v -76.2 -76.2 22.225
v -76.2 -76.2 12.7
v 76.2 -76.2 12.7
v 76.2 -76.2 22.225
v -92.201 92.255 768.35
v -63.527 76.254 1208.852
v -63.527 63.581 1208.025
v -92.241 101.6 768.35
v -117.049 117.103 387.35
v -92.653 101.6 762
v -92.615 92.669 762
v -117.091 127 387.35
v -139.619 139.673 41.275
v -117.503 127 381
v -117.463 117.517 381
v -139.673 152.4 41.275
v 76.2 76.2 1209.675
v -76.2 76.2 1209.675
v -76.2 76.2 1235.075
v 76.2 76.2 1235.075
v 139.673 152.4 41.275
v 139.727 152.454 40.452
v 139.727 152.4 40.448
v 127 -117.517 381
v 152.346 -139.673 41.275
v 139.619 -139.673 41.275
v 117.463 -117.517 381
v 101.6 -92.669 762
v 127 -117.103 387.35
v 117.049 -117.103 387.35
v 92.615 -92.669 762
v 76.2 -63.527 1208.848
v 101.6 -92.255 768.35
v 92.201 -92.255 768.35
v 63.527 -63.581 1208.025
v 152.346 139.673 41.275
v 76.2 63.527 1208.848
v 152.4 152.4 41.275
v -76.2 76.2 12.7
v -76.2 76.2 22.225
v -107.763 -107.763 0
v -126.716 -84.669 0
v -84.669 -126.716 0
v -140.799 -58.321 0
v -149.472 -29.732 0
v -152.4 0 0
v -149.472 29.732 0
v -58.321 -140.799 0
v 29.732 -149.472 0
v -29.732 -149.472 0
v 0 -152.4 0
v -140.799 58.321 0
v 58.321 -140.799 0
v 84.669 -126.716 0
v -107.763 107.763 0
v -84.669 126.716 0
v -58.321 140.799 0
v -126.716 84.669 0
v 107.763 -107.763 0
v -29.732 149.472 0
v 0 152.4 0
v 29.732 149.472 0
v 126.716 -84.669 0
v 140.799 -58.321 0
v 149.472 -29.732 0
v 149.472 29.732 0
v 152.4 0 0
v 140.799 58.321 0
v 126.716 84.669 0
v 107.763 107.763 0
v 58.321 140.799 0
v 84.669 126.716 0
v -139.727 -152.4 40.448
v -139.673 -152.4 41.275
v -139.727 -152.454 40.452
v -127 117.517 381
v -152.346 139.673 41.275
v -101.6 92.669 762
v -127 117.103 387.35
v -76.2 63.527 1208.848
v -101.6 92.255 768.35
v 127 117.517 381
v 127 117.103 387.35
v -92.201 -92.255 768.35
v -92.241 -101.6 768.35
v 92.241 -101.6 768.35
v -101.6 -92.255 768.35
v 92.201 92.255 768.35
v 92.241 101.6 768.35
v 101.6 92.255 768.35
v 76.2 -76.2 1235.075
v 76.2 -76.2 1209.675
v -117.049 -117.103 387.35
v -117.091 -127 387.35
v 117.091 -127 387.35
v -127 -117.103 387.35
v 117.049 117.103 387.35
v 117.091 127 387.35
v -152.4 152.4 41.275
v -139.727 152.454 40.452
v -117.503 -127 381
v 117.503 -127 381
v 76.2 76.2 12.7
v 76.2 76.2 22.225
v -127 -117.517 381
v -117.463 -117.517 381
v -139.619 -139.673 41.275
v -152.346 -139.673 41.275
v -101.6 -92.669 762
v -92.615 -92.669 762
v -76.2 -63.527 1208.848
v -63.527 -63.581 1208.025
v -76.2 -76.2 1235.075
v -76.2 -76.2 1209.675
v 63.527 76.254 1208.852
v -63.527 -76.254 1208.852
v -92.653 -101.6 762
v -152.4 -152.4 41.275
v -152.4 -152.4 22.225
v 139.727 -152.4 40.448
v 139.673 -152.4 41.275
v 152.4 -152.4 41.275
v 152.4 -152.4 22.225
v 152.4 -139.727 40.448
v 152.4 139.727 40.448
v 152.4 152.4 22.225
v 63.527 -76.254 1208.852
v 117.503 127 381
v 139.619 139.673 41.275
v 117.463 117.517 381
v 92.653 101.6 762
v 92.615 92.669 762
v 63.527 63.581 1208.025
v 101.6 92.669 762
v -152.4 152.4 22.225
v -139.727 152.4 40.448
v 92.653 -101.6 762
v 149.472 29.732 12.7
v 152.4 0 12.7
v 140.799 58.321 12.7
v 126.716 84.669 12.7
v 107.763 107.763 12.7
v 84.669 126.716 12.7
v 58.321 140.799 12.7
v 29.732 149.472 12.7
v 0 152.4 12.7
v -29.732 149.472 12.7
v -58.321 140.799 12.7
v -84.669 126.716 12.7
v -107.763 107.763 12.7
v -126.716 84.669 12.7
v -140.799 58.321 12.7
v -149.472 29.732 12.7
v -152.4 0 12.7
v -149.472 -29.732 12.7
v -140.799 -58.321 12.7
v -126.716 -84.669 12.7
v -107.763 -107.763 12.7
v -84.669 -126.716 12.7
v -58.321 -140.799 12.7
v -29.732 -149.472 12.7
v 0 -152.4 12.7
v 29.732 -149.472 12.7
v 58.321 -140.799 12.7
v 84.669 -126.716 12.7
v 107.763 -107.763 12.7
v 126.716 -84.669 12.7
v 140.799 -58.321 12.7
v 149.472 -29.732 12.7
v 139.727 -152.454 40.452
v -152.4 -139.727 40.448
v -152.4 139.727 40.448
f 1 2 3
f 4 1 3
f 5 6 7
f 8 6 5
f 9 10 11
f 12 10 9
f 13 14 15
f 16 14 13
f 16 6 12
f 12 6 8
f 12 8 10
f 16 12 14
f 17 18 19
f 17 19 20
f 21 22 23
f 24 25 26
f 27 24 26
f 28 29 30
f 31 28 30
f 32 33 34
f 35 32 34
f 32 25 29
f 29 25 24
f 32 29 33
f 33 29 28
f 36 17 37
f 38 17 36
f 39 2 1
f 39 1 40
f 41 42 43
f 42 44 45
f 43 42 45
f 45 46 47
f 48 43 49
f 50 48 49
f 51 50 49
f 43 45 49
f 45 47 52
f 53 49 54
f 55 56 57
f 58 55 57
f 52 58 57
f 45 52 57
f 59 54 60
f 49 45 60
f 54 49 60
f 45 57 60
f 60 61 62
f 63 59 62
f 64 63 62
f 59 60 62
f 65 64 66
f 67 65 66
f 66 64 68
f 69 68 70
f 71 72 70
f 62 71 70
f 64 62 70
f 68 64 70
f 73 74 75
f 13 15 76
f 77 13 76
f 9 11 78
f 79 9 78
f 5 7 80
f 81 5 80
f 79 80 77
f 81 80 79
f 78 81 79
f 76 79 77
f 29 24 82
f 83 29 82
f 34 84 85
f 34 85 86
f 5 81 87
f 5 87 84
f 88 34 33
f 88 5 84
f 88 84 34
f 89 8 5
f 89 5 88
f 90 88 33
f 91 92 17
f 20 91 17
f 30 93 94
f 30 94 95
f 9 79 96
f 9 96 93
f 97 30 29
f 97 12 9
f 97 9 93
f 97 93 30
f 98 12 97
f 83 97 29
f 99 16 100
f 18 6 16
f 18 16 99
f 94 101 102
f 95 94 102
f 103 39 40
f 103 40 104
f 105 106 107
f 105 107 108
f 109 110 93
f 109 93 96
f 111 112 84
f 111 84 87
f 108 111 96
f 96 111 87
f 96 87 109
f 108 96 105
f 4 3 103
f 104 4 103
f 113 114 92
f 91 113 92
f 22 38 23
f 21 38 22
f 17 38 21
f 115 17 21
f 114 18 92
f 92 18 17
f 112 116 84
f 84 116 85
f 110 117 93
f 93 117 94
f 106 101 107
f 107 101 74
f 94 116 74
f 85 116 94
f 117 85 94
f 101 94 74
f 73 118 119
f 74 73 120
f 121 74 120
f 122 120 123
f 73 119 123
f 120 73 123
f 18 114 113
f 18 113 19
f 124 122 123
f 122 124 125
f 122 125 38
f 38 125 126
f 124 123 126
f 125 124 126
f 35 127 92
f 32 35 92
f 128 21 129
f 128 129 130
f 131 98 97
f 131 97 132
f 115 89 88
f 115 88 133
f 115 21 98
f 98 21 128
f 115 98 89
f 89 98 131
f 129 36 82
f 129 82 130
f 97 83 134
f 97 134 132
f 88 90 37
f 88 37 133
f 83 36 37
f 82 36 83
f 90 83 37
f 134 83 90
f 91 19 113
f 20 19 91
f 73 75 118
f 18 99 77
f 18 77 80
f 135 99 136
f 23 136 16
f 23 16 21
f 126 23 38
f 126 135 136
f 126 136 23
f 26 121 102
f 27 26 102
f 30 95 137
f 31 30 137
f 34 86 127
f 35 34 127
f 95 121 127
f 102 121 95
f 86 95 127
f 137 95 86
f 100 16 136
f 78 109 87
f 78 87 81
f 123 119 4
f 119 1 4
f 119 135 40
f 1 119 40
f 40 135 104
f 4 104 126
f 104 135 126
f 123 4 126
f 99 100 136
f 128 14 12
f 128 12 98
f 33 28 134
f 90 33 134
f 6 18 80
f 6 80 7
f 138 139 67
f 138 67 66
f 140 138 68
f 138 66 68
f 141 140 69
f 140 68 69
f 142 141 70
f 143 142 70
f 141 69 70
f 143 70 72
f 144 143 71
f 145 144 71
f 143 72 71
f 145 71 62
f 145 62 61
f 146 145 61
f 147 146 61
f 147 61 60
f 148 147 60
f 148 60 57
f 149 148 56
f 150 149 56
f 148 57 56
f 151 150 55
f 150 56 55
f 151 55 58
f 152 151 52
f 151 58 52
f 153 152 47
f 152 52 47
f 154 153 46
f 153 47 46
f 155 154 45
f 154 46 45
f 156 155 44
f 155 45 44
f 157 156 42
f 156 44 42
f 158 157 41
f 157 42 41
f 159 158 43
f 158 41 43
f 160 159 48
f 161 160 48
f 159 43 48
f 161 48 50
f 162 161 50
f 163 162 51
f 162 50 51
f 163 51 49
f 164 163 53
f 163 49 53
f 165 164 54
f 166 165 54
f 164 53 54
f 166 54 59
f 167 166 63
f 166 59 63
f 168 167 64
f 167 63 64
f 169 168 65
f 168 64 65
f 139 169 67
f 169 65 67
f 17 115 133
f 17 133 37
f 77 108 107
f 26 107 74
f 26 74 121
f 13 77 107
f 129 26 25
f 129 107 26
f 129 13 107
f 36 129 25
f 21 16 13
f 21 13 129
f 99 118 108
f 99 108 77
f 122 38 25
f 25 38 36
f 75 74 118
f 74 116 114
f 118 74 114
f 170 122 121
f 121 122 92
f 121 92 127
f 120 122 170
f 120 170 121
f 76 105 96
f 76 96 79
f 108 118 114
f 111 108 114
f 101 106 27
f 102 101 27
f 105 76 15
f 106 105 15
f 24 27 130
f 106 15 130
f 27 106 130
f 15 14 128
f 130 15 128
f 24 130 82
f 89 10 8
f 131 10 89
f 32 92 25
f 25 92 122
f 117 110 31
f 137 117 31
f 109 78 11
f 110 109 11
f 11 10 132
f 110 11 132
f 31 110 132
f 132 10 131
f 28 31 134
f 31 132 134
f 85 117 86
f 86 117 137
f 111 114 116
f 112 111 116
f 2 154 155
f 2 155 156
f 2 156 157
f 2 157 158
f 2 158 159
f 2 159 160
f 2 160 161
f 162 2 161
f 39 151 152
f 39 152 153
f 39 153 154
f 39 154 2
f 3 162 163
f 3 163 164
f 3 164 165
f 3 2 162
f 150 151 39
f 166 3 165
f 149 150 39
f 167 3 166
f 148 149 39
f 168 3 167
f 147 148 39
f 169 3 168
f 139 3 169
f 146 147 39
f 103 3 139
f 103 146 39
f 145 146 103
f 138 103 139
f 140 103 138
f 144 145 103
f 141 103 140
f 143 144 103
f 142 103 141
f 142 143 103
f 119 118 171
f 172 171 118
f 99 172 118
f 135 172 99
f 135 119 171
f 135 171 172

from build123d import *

# Parameters (mm, degrees)
F0_R      = 152.4
F1_DEPTH  = 12.7
F2_W      = 152.4
F2_H      = 152.4
F3_DEPTH  = 9.525
F4_W      = 304.8
F4_H      = 304.8
F5_DEPTH  = 19.05
F7_W      = 152.4
F7_H      = 152.4
F8_DEPTH  = 25.4
F11_DEPTH = 12.7
F13_W     = 254
F13_H     = 254
F14_DEPTH = 6.35
F16_W     = 203.2
F16_H     = 203.2
F17_DEPTH = 6.35


# Not quite as in the source:
# - a pattern or mirror of a feature is missing from the dataset's text; its kind, count and spacing are read off the source's solid


with BuildPart() as f1:
    # F0 (on Top) → F1 (new body)
    with BuildSketch(Plane.XY):
        Circle(F0_R)
    extrude(amount=F1_DEPTH)

    # F2 (on face) → F3 (join)
    with BuildSketch(Plane.XY.offset(12.7)):
        Rectangle(F2_W, F2_H)
    extrude(amount=F3_DEPTH)

    # F4 (on face) → F5 (join)
    with BuildSketch(Plane.XY.offset(22.225)):
        Rectangle(F4_W, F4_H)
    extrude(amount=F5_DEPTH)

    # F10 (on 3pt) → F11 (join)
    with BuildSketch(Plane(origin=(0, -154.4349882353, 10.0718470588), x_dir=(-1, 0, 0), z_dir=(0, 0.997880106, -0.0650791373))):
        Polygon((152.4, 31.2694408423), (76.2, 1202.1515869185), (63.5268089897, 1201.3268265801), (139.7268089897, 30.4446805039), align=None)
        Polygon((-63.5268089897, 1201.3268265801), (-76.2, 1202.1515869185), (-152.4, 31.2694408423), (-139.7268089897, 30.4446805039), align=None)
    f11 = extrude(amount=F11_DEPTH)

    # F11_copies: F11 across plane
    add(f11.mirror(Plane.ZX))

    # F13 (on offset) → F14 (join)
    with BuildSketch(Plane.XY.offset(381)):
        Rectangle(F13_W, F13_H)
    extrude(amount=F14_DEPTH)

    # F16 (on offset) → F17 (join)
    with BuildSketch(Plane.XY.offset(762)):
        Rectangle(F16_W, F16_H)
    extrude(amount=F17_DEPTH)


with BuildPart() as f8:
    # F7 (on offset) → F8 (new body)
    with BuildSketch(Plane.XY.offset(1209.675)):
        Rectangle(F7_W, F7_H)
    extrude(amount=F8_DEPTH)


solid = Compound([f1.part, f8.part])
